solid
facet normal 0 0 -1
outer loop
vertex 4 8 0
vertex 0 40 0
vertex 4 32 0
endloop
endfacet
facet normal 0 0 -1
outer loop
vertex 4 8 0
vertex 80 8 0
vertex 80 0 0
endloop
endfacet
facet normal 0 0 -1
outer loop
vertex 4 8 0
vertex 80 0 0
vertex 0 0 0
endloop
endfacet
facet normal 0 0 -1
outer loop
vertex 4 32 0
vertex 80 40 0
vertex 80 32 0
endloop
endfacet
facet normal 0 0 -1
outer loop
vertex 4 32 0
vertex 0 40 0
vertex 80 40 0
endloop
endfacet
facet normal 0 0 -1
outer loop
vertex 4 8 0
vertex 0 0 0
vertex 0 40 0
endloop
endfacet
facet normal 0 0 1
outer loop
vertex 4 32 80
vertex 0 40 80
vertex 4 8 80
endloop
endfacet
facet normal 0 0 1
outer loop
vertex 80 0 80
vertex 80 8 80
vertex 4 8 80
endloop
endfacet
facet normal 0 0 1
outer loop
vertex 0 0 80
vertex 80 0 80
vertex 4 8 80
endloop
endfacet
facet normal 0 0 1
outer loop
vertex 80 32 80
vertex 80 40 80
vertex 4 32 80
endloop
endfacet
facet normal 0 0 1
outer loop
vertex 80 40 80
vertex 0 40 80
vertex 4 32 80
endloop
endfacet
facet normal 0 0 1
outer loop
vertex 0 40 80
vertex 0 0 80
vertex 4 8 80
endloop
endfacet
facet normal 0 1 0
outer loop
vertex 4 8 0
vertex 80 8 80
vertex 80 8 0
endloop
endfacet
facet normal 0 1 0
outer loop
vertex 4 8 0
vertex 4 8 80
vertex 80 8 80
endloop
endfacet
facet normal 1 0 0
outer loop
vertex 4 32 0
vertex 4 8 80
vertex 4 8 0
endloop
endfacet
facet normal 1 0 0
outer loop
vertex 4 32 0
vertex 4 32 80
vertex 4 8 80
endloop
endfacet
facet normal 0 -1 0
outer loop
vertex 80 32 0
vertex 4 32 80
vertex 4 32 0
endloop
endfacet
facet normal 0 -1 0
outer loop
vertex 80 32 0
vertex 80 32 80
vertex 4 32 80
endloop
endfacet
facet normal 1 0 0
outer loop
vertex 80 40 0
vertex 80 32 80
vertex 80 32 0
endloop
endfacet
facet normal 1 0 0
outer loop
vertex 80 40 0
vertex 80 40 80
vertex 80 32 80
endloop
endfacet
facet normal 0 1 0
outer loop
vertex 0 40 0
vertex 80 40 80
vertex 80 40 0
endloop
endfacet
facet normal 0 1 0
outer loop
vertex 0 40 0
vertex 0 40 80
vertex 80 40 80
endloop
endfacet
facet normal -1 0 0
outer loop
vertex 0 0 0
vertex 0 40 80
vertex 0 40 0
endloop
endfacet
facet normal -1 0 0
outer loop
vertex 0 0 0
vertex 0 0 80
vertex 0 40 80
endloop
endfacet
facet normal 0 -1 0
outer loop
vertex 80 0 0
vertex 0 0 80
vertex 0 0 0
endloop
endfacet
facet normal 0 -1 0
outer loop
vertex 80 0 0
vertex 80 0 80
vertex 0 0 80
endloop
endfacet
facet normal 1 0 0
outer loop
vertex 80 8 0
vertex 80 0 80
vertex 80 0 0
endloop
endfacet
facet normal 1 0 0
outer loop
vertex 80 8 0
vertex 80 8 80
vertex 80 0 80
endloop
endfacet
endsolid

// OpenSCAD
$fn = 32;

// ----------------------------------------------------------------------
// Structural section: channel 80 x 40 mm
// ----------------------------------------------------------------------

// --- parameters (mm) ---
sec_w = 80;               // channel width, X
sec_h = 40;               // channel height, Y
flange_t = 8;             // flange thickness
web_t = 4;                // web thickness
plate_t = 80;             // cut length, Z (extrusion height)

profile = [[0, 0], [80, 0], [80, 8], [4, 8], [4, 32], [80, 32], [80, 40], [0, 40]];  // primary outline, 8 points, counter clockwise

// --- the one profile operation ---
linear_extrude(height = plate_t) polygon(points = profile);
